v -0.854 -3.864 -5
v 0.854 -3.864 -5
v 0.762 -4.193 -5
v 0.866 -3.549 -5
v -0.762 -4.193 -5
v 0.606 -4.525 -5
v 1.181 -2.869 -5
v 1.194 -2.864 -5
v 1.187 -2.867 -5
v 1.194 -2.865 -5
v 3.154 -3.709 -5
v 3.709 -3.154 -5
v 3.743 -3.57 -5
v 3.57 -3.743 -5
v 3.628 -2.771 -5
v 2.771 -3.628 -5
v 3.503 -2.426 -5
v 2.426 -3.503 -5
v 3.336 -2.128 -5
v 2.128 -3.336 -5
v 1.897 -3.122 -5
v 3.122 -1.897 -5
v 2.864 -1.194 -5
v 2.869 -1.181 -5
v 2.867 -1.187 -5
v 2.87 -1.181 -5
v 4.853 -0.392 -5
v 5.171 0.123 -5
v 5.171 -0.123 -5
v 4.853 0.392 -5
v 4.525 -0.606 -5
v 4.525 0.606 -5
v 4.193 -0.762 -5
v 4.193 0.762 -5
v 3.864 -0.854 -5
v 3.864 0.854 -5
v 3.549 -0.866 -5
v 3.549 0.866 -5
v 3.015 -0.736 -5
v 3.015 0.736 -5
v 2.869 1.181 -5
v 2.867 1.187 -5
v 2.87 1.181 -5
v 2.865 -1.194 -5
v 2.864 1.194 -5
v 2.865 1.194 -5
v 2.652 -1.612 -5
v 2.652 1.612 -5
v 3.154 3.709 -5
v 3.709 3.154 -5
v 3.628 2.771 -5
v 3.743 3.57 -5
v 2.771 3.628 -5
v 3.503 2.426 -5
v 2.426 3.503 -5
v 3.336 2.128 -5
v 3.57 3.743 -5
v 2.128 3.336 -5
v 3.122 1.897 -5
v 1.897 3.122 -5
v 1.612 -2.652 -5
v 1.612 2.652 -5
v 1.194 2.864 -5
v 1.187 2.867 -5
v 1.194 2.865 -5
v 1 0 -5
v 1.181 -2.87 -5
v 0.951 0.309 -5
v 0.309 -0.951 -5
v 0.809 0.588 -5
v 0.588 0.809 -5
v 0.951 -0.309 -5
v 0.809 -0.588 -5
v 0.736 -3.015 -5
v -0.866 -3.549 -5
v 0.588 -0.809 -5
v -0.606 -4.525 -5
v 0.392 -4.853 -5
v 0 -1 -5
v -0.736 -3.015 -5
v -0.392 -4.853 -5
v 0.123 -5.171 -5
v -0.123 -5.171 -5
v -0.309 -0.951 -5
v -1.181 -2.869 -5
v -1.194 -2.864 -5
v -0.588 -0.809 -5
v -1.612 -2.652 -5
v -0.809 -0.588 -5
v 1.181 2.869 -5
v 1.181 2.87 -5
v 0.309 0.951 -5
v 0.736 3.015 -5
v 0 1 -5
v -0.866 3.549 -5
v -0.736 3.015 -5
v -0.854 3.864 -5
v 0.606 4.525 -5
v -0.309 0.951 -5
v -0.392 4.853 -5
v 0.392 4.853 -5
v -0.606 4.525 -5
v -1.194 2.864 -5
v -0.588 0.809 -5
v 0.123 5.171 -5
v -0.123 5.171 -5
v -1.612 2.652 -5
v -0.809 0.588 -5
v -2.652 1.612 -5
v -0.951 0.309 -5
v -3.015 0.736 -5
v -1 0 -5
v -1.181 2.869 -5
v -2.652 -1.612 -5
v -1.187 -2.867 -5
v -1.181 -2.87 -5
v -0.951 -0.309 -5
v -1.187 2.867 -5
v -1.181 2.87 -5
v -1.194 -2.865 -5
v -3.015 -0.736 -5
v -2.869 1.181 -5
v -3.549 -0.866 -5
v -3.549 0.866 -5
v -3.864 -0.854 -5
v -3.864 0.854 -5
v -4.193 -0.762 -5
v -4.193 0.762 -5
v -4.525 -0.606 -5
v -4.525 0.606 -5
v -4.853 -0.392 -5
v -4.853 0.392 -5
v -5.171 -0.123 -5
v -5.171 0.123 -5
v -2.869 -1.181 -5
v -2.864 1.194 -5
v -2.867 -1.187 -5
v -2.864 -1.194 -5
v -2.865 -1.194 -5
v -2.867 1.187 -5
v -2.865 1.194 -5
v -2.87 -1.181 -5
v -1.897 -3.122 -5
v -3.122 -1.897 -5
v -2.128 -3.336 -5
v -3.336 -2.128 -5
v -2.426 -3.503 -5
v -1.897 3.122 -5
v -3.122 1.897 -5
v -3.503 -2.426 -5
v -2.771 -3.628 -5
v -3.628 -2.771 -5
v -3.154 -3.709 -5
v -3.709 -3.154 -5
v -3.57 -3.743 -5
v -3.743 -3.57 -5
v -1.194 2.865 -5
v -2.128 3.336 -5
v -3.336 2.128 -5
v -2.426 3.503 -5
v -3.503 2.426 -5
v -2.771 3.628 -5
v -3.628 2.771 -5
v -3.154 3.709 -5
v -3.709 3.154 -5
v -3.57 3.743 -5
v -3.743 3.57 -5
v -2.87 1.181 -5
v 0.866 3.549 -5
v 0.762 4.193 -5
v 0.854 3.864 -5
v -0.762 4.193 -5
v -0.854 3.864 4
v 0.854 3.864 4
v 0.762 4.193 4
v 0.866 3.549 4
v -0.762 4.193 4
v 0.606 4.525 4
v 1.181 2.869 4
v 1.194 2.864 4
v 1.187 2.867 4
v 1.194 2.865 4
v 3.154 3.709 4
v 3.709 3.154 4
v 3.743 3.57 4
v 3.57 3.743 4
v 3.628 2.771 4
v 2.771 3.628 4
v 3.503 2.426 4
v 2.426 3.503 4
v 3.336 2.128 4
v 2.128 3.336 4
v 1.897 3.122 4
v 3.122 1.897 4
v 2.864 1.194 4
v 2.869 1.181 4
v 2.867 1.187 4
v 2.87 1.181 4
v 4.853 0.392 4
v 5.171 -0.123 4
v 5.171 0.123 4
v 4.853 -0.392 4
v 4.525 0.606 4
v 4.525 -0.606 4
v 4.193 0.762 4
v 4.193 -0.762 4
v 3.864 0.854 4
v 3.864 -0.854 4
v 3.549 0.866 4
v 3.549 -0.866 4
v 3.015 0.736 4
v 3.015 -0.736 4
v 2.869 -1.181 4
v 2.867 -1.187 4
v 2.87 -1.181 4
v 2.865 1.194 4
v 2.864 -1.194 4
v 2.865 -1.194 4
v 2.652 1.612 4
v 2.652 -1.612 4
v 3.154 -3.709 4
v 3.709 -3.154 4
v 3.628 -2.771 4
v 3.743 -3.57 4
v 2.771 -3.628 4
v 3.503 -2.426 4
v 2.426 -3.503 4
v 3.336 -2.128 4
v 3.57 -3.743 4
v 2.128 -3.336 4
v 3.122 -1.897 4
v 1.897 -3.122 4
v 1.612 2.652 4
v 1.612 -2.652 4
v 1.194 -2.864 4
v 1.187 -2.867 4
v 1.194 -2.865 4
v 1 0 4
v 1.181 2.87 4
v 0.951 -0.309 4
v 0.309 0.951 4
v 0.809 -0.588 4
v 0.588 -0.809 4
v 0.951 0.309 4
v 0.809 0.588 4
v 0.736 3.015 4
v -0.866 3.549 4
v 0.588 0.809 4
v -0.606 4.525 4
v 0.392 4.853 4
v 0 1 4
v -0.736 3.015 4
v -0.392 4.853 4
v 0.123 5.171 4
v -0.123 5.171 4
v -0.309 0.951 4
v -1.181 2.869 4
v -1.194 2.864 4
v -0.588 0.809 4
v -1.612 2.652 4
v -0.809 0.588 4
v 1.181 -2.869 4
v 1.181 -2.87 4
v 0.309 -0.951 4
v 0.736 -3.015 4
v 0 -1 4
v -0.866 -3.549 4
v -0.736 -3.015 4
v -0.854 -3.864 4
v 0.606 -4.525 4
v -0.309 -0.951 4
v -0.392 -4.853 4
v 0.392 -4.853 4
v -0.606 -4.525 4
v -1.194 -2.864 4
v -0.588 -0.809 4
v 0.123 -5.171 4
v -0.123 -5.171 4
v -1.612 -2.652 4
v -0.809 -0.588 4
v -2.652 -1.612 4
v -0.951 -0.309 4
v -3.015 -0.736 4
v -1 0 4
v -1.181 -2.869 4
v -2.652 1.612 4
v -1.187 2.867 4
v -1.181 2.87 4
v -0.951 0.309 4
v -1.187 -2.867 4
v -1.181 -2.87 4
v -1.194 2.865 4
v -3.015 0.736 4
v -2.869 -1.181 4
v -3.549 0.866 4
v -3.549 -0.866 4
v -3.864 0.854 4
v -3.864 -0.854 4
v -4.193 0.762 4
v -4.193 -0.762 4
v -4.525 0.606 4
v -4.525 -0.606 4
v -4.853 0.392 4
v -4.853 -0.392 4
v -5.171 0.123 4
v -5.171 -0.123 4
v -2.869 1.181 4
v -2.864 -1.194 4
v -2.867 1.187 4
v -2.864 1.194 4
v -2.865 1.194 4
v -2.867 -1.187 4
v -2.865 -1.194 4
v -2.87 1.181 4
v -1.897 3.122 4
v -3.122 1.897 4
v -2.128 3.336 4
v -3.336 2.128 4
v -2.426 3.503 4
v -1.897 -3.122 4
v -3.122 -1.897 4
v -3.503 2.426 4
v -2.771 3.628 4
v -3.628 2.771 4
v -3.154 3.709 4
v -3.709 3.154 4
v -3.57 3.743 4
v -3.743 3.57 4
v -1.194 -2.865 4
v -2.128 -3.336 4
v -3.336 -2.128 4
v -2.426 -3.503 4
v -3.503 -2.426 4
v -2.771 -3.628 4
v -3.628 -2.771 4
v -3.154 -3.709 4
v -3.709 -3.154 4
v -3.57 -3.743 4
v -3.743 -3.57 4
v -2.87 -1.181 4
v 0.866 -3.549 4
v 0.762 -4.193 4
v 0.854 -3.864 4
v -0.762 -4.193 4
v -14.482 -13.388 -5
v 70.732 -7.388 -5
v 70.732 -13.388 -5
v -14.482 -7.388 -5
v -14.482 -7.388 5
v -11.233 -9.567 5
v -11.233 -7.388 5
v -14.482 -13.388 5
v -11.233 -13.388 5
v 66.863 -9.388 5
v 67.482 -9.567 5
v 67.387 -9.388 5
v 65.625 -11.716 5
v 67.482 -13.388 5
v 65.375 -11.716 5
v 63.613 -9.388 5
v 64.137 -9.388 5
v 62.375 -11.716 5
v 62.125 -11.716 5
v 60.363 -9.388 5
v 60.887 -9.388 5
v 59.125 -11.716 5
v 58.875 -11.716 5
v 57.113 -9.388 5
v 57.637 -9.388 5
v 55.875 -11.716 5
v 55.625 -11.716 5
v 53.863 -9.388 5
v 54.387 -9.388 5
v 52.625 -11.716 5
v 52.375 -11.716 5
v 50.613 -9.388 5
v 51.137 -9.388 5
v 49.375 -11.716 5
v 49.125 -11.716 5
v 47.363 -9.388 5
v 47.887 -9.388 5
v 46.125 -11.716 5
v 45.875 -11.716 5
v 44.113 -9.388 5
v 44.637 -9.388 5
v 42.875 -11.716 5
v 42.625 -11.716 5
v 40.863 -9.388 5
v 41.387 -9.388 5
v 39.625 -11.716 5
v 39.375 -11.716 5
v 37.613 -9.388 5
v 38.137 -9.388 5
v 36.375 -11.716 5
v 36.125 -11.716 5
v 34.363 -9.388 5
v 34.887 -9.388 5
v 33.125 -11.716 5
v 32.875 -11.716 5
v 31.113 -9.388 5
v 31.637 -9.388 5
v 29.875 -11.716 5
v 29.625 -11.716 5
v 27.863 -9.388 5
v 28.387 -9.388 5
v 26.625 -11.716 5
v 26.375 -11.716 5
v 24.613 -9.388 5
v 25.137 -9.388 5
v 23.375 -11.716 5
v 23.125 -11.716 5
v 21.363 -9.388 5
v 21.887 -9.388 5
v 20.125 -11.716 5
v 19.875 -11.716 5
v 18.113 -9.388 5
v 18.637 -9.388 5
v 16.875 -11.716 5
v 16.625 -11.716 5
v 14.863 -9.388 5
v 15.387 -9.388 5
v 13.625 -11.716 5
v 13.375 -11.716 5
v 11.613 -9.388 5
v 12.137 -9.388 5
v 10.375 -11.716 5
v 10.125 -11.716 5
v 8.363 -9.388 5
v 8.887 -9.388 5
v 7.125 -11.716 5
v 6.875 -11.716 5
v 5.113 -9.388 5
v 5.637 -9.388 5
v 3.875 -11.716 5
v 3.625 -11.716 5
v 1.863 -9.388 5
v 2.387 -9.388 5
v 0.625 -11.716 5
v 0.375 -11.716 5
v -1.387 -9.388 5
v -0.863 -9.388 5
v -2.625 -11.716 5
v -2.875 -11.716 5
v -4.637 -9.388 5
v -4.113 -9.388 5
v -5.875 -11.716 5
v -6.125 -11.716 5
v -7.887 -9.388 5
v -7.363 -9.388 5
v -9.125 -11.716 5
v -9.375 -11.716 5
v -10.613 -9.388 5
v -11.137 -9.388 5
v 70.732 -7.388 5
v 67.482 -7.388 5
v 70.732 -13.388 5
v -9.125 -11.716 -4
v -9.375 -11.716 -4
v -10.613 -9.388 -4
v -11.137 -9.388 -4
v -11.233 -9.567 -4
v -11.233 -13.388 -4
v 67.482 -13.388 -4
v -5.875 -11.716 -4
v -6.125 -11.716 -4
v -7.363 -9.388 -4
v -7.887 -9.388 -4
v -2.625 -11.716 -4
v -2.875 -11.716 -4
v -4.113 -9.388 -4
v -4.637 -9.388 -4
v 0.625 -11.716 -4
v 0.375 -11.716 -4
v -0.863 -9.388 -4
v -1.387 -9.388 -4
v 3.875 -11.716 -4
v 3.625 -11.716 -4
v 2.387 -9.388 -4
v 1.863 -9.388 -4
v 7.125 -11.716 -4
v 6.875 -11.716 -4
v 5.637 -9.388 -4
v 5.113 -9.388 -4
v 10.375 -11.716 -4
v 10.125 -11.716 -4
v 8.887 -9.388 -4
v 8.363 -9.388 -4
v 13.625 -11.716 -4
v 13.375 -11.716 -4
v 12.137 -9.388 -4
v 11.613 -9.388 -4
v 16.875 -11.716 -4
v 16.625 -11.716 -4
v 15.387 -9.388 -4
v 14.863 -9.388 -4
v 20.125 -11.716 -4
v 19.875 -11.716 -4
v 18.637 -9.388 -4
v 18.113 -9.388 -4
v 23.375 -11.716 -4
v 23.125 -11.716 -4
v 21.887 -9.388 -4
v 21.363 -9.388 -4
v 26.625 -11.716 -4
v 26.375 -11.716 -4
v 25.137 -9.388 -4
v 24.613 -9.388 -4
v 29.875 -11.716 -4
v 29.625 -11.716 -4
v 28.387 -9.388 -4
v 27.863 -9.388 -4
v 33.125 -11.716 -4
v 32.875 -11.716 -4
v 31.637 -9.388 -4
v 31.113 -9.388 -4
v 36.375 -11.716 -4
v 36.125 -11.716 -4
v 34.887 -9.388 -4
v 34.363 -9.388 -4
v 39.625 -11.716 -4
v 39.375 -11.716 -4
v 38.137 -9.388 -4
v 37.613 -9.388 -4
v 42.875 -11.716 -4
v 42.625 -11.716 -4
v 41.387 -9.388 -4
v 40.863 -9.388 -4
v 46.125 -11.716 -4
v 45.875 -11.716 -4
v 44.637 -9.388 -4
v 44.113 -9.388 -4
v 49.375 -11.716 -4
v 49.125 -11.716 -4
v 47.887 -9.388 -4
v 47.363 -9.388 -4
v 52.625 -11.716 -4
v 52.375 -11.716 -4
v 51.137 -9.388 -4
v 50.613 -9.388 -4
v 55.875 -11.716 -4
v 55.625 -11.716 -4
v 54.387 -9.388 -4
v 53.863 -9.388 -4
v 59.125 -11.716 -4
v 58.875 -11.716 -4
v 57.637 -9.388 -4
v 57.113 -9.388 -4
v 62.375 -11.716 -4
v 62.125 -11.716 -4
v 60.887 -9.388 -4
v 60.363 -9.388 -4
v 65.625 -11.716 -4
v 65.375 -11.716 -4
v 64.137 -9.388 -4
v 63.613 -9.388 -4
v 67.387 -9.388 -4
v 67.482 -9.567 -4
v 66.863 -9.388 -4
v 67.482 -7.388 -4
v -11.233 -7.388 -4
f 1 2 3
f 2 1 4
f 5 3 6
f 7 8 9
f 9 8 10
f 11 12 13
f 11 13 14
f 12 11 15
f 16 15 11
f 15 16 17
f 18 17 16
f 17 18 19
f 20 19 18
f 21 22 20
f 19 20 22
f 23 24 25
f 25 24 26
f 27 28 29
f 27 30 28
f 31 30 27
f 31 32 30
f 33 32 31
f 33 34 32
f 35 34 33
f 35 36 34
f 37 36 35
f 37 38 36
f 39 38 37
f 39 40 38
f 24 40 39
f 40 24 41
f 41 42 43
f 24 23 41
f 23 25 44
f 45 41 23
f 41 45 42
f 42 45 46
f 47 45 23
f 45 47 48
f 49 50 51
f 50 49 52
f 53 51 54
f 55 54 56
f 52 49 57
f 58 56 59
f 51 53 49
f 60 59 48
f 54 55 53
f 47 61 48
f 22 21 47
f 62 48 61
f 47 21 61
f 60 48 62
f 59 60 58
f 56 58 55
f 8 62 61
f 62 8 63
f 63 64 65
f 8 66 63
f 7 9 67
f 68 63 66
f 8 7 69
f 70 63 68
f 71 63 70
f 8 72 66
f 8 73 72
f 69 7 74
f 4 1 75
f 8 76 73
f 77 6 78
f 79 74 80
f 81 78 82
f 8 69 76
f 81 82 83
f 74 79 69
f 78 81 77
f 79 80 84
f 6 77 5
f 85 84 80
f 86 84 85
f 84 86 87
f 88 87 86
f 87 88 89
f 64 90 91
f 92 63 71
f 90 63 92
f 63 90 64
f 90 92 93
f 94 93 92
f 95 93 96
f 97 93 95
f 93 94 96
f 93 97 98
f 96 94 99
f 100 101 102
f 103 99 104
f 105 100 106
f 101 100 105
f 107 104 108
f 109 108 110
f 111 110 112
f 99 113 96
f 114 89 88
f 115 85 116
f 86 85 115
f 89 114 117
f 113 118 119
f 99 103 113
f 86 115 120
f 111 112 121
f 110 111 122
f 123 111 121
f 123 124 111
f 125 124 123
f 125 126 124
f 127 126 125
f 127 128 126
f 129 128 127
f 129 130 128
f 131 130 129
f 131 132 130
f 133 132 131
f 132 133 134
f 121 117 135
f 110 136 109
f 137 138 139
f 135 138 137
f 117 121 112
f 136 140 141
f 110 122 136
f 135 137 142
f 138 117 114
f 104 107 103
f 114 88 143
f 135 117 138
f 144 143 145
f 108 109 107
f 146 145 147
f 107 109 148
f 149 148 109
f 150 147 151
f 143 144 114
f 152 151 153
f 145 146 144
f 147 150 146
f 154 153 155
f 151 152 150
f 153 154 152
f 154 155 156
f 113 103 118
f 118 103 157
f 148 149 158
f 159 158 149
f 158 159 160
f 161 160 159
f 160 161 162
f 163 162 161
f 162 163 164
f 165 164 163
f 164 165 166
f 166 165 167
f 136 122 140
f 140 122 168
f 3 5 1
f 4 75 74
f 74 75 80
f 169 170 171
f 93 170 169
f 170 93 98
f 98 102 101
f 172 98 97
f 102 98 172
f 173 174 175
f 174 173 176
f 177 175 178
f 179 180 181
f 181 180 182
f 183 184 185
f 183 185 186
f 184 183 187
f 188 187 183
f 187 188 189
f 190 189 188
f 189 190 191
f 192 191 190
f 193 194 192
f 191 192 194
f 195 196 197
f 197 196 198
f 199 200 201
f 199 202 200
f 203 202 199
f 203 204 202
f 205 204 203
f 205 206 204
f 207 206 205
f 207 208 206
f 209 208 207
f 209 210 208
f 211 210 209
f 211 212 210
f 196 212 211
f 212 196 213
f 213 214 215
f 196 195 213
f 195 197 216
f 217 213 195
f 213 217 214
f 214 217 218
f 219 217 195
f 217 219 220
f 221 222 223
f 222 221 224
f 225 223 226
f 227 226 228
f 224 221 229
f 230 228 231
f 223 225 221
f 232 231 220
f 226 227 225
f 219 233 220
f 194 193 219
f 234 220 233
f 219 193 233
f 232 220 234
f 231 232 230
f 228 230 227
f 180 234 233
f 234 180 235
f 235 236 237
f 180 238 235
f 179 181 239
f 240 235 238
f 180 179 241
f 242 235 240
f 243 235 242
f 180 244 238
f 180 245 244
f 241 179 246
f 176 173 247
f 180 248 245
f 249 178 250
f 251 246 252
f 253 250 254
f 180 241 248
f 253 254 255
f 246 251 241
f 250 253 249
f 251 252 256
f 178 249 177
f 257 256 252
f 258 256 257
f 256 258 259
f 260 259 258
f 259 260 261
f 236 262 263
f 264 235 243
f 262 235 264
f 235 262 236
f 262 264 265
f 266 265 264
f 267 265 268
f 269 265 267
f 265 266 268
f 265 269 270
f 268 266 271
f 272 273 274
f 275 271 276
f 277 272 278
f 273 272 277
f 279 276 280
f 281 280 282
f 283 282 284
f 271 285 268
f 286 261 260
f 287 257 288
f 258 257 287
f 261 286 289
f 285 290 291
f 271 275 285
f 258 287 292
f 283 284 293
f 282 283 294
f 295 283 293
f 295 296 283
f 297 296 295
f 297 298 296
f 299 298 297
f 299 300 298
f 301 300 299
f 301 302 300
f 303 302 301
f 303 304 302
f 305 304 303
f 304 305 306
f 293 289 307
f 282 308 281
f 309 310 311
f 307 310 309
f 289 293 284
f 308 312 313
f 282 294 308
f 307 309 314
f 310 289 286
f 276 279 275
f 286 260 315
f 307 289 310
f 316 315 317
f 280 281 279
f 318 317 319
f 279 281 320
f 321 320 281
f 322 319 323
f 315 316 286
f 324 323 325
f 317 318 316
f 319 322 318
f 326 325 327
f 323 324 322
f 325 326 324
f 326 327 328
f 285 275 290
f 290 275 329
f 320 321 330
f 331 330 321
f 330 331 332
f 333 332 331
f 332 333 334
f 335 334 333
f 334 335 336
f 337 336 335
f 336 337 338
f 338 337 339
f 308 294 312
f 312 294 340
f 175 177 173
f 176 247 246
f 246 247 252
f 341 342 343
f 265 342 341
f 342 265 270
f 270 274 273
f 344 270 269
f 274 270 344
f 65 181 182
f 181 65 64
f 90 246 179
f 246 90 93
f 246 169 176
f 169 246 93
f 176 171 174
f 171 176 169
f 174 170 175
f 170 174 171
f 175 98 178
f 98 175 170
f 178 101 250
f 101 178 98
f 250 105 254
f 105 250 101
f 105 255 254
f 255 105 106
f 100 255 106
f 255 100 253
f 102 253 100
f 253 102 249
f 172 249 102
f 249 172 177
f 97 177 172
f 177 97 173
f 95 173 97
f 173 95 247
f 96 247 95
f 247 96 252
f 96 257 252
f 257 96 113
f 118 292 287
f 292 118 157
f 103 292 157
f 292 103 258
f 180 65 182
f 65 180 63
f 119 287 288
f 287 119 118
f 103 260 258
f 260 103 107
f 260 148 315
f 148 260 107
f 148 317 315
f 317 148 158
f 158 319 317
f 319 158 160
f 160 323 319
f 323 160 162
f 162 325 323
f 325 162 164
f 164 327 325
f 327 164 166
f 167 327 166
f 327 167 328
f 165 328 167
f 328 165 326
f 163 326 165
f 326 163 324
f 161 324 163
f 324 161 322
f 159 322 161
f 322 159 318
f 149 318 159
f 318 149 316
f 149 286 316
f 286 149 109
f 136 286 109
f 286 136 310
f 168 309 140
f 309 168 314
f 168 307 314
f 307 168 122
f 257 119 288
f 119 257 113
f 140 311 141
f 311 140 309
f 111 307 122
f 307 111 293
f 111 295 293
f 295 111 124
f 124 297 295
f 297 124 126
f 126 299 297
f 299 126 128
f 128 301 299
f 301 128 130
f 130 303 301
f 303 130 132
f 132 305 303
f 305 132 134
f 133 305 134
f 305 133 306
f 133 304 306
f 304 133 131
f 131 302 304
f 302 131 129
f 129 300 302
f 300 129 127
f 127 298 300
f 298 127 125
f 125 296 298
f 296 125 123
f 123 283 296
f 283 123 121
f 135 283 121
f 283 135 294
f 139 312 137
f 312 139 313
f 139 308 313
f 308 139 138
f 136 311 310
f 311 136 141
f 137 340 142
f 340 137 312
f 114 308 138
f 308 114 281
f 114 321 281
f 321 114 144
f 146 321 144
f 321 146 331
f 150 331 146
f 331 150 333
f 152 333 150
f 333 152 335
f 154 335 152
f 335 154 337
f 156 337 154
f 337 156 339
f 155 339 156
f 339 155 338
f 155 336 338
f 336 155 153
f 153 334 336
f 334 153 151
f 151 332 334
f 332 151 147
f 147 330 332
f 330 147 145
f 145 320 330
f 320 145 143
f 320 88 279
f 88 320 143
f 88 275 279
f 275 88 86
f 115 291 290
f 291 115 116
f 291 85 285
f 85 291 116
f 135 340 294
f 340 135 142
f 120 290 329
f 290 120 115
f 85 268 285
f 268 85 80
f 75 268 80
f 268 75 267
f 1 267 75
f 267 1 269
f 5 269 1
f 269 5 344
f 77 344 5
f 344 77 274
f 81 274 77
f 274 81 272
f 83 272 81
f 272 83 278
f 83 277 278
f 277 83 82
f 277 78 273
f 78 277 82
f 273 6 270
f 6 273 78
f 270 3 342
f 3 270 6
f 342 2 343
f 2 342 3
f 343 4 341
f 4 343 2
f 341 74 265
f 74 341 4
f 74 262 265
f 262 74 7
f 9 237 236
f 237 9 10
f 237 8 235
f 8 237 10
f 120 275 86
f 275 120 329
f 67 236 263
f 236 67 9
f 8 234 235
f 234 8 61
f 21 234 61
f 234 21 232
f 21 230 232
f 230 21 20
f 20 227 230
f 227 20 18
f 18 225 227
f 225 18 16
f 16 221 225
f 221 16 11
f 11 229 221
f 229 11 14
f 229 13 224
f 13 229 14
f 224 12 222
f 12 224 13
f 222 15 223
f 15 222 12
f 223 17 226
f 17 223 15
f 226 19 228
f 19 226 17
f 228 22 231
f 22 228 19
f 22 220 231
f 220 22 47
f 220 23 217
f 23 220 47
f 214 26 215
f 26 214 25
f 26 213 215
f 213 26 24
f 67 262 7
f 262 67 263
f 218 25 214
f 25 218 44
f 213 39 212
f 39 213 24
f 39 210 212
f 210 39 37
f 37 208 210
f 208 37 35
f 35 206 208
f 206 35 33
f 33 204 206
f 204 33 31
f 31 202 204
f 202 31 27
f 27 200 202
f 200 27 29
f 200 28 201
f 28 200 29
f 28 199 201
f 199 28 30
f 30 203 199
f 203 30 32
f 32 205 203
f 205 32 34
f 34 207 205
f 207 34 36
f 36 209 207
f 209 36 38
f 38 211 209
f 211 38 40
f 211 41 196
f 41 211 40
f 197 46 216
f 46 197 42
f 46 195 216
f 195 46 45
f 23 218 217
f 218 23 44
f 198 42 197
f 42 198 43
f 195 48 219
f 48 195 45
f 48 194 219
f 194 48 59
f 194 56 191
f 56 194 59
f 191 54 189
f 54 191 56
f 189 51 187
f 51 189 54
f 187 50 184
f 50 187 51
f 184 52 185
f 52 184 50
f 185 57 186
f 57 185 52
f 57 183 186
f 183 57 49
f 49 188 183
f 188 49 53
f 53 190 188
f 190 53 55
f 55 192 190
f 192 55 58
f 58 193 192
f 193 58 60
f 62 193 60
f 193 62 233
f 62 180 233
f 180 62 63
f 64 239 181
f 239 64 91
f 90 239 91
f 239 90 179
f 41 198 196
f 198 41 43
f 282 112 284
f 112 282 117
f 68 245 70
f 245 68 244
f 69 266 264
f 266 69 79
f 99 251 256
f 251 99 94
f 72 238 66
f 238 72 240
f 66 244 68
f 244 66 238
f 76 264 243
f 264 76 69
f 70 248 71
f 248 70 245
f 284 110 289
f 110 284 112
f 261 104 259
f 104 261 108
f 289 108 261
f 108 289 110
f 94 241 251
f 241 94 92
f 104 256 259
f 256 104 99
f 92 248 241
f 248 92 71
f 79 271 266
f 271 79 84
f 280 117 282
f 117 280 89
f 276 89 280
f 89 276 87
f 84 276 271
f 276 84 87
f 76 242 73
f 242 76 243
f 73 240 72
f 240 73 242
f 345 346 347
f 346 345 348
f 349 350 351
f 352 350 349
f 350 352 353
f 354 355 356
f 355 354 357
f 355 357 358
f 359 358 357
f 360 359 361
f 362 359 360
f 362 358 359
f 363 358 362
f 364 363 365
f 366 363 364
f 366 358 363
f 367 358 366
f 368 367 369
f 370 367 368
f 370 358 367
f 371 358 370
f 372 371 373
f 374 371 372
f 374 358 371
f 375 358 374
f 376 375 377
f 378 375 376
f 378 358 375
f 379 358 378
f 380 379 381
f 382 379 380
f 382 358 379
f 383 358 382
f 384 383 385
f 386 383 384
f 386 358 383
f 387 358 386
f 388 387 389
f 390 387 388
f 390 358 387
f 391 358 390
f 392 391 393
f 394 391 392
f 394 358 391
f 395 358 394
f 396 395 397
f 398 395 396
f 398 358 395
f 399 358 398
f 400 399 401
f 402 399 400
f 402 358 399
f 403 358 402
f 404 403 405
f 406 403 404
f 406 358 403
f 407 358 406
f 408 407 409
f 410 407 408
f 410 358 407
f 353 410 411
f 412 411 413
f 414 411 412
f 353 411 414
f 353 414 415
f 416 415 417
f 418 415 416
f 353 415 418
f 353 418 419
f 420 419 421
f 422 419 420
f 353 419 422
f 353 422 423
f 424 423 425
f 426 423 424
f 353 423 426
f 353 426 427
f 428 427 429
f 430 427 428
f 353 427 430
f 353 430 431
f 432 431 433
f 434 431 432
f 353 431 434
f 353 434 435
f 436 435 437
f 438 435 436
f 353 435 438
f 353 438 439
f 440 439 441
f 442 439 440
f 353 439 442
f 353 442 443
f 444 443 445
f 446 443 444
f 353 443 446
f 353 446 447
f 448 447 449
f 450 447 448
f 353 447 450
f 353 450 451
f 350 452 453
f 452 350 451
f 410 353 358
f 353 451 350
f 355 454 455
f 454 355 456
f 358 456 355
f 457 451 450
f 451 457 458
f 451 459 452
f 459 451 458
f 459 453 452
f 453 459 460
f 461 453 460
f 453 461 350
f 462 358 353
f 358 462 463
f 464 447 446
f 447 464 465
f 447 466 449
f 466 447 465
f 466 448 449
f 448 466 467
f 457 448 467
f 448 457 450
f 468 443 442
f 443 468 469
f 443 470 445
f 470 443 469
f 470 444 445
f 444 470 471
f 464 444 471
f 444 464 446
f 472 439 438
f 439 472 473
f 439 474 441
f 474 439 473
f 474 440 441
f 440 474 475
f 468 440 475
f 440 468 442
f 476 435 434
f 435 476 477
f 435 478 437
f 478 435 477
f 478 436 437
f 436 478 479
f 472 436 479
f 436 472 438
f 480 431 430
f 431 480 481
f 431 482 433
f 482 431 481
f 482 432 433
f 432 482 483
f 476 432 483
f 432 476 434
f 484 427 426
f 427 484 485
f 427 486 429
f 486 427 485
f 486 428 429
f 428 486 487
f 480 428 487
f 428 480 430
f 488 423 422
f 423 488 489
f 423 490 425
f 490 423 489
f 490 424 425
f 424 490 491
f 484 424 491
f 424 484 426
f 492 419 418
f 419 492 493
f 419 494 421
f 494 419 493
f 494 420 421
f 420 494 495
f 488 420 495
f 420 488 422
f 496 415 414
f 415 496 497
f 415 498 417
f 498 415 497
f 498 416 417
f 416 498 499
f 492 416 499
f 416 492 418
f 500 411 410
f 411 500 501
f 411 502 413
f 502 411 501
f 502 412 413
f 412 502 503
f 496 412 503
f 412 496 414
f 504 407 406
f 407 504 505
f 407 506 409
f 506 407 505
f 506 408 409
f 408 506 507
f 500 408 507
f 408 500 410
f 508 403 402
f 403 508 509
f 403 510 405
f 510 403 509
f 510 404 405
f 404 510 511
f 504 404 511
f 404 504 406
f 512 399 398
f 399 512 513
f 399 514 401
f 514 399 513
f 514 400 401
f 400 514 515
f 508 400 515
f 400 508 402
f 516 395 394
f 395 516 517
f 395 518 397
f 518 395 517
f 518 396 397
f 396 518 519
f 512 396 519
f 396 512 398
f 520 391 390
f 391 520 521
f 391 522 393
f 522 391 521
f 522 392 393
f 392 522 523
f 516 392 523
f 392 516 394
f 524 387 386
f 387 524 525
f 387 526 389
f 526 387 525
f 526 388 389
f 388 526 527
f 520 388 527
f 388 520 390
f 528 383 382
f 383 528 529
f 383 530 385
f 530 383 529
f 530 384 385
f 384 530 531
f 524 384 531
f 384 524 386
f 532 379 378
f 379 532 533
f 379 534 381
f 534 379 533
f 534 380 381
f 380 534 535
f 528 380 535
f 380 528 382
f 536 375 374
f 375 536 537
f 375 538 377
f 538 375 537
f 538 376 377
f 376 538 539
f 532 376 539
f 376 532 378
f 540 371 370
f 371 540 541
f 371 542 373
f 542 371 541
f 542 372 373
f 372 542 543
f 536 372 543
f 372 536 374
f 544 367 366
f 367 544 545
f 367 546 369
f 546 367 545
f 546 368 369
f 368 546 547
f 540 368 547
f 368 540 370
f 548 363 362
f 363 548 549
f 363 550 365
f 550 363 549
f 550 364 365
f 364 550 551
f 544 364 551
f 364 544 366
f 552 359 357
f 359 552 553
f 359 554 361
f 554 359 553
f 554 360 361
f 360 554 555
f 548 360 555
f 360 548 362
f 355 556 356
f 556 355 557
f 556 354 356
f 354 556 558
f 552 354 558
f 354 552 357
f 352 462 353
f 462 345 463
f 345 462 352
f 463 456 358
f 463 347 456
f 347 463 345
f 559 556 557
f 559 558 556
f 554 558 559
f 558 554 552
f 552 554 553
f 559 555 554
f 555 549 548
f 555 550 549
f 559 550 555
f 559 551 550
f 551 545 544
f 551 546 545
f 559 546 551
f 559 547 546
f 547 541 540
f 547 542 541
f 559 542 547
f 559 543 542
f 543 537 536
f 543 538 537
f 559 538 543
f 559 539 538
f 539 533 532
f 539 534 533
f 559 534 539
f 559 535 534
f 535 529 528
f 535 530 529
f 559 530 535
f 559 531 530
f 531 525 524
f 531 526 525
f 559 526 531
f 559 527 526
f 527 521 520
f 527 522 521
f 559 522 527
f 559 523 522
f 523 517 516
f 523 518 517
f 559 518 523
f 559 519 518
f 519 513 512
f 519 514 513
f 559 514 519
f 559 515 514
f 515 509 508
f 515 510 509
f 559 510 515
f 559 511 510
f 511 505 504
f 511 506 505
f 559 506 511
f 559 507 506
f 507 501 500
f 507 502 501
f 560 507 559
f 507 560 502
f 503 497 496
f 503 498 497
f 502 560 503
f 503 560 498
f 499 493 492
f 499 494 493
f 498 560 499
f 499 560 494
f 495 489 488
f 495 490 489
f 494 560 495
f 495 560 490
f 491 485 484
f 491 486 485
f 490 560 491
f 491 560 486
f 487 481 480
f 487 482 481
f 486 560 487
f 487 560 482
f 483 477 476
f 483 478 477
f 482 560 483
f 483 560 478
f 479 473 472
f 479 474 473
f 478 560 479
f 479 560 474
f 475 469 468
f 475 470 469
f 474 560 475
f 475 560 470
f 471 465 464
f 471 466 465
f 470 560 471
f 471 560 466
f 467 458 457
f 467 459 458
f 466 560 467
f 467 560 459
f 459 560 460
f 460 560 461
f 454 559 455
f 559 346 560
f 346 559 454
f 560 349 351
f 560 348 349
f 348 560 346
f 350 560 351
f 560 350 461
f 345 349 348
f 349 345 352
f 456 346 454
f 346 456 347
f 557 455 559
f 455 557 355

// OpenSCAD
//This is a modification of " Public Domain Parametric Involute Spur Gear (and involute helical gear and involute rack)
// by Leemon Baird, 2011, Leemon@Leemon.com
//http://www.thingiverse.com/thing:5505  "

//Modifications by racatack June 2016:
//  -Incorporated 'module InvoluteGear_rack()' from the 11/11/15 comment by quisam2342 in thing:5505 to fix noted problems in rack generation at various tooth sizes
//  -Added a section for an optional 'backboard' that can be used to stiffen an otherwise skinny rack
//  -Added sections for optional Stop Blocks at either or both ends of a rack
//  -Removed extra gears from the example since I only need one pinion. See thing:5505 example section to gain more insight into gear generation.





//////////////////////////////////////////////////////////////////////////////////////////////
// Public Domain Parametric Involute Spur Gear (and involute helical gear and involute rack)
// version 1.1
// by Leemon Baird, 2011, Leemon@Leemon.com
//http://www.thingiverse.com/thing:5505
//
// This file is public domain.  Use it for any purpose, including commercial
// applications.  Attribution would be nice, but is not required.  There is
// no warranty of any kind, including its correctness, usefulness, or safety.
//
// This is parameterized involute spur (or helical) gear.  It is much simpler and less powerful than
// others on Thingiverse.  But it is public domain.  I implemented it from scratch from the
// descriptions and equations on Wikipedia and the web, using Mathematica for calculations and testing,
// and I now release it into the public domain.
//
//		http://en.wikipedia.org/wiki/Involute_gear
//		http://en.wikipedia.org/wiki/Gear
//		http://en.wikipedia.org/wiki/List_of_gear_nomenclature
//		http://gtrebaol.free.fr/doc/catia/spur_gear.html
//		http://www.cs.cmu.edu/~rapidproto/mechanisms/chpt7.html
//
// The module gear() gives an involute spur gear, with reasonable defaults for all the parameters.
// Normally, you should just choose the first 4 parameters, and let the rest be default values.
// The module gear() gives a gear in the XY plane, centered on the origin, with one tooth centered on
// the positive Y axis.  The various functions below it take the same parameters, and return various
// measurements for the gear.  The most important is pitch_radius, which tells how far apart to space
// gears that are meshing, and adendum_radius, which gives the size of the region filled by the gear.
// A gear has a "pitch circle", which is an invisible circle that cuts through the middle of each
// tooth (though not the exact center). In order for two gears to mesh, their pitch circles should
// just touch.  So the distance between their centers should be pitch_radius() for one, plus pitch_radius()
// for the other, which gives the radii of their pitch circles.
//
// In order for two gears to mesh, they must have the same mm_per_tooth and pressure_angle parameters.
// mm_per_tooth gives the number of millimeters of arc around the pitch circle covered by one tooth and one
// space between teeth.  The pitch angle controls how flat or bulged the sides of the teeth are.  Common
// values include 14.5 degrees and 20 degrees, and occasionally 25.  Though I've seen 28 recommended for
// plastic gears. Larger numbers bulge out more, giving stronger teeth, so 28 degrees is the default here.
//
// The ratio of number_of_teeth for two meshing gears gives how many times one will make a full
// revolution when the the other makes one full revolution.  If the two numbers are coprime (i.e.
// are not both divisible by the same number greater than 1), then every tooth on one gear
// will meet every tooth on the other, for more even wear.  So coprime numbers of teeth are good.
//
// The module rack() gives a rack, which is a bar with teeth.  A rack can mesh with any
// gear that has the same mm_per_tooth and pressure_angle.
//
// Some terminology:
// The outline of a gear is a smooth circle (the "pitch circle") which has mountains and valleys
// added so it is toothed.  So there is an inner circle (the "root circle") that touches the
// base of all the teeth, an outer circle that touches the tips of all the teeth,
// and the invisible pitch circle in between them.  There is also a "base circle", which can be smaller than
// all three of the others, which controls the shape of the teeth.  The side of each tooth lies on the path
// that the end of a string would follow if it were wrapped tightly around the base circle, then slowly unwound.
// That shape is an "involute", which gives this type of gear its name.
//
//////////////////////////////////////////////////////////////////////////////////////////////

//An involute spur gear, with reasonable defaults for all the parameters.
//Normally, you should just choose the first 4 parameters, and let the rest be default values.
//Meshing gears must match in mm_per_tooth, pressure_angle, and twist,
//and be separated by the sum of their pitch radii, which can be found with pitch_radius().
module gear (
        mm_per_tooth    = 3,    //this is the "circular pitch", the circumference of the pitch circle divided by the number of teeth
        number_of_teeth = 11,   //total number of teeth around the entire perimeter
        thickness       = 6,    //thickness of gear in mm
        hole_diameter   = 3,    //diameter of the hole in the center, in mm
        twist           = 0,    //teeth rotate this many degrees from bottom of gear to top.  360 makes the gear a screw with each thread going around once
        teeth_to_hide   = 0,    //number of teeth to delete to make this only a fraction of a circle
        pressure_angle  = 28,   //Controls how straight or bulged the tooth sides are. In degrees.
        clearance       = 0.0,  //gap between top of a tooth on one gear and bottom of valley on a meshing gear (in millimeters)
        backlash        = 0.0   //gap between two meshing teeth, in the direction along the circumference of the pitch circle
    )
{
assign(pi = 3.1415926)
assign(p  = mm_per_tooth * number_of_teeth / pi / 2)  //radius of pitch circle
assign(c  = p + mm_per_tooth / pi - clearance)        //radius of outer circle
assign(b  = p*cos(pressure_angle))                    //radius of base circle
assign(r  = p-(c-p)-clearance)                        //radius of root circle
assign(t  = mm_per_tooth/2-backlash/2)                //tooth thickness at pitch circle
assign(k  = -iang(b, p) - t/2/p/pi*180)               //angle to where involute meets base circle on each side of tooth
{
    difference()
    {
        for (i = [0:number_of_teeth-teeth_to_hide-1] )
            rotate([0,0,i*360/number_of_teeth])
            linear_extrude(height = thickness, center = true, convexity = 10, twist = twist)
            polygon(
                points=[
                           [0, -hole_diameter/10],
                           polar(r, -181/number_of_teeth),
                           polar(r, r<b ? k : -180/number_of_teeth),
                           q7(0/5,r,b,c,k, 1),q7(1/5,r,b,c,k, 1),q7(2/5,r,b,c,k, 1),q7(3/5,r,b,c,k, 1),q7(4/5,r,b,c,k, 1),q7(5/5,r,b,c,k, 1),
                           q7(5/5,r,b,c,k,-1),q7(4/5,r,b,c,k,-1),q7(3/5,r,b,c,k,-1),q7(2/5,r,b,c,k,-1),q7(1/5,r,b,c,k,-1),q7(0/5,r,b,c,k,-1),
                           polar(r, r<b ? -k : 180/number_of_teeth),
                           polar(r, 181/number_of_teeth)
                       ],
                paths=[[0,1,2,3,4,5,6,7,8,9,10,11,12,13,14,15,16]]
            );
        cylinder(h=2*thickness+1, r=hole_diameter/2, center=true, $fn=20);
    }
}
};
//these 4 functions are used by gear
function polar(r,theta)   = r*[sin(theta), cos(theta)];                            //convert polar to cartesian coordinates
function iang(r1,r2)      = sqrt((r2/r1)*(r2/r1) - 1)/3.1415926*180 - acos(r1/r2); //unwind a string this many degrees to go from radius r1 to radius r2
function q7(f,r,b,r2,t,s) = q6(b,s,t,(1-f)*max(b,r)+f*r2);                         //radius a fraction f up the curved side of the tooth
function q6(b,s,t,d)      = polar(d,s*(iang(b,d)+t));                              //point at radius d on the involute curve

//a rack, which is a straight line with teeth (the same as a segment from a giant gear with a huge number of teeth).
//The "pitch circle" is a line along the X axis.
//module rack (
//	mm_per_tooth    = 3,    //this is the "circular pitch", the circumference of the pitch circle divided by the number //of teeth
//	number_of_teeth = 11,   //total number of teeth along the rack
//	thickness       = 6,    //thickness of rack in mm (affects each tooth)
//	height          = 120,   //height of rack in mm, from tooth top to far side of rack.
//	pressure_angle  = 28,   //Controls how straight or bulged the tooth sides are. In degrees.
//	backlash        = 0.0   //gap between two meshing teeth, in the direction along the circumference of the pitch circle
//) {
//	assign(pi = 3.1415926)
//	assign(a = mm_per_tooth / pi) //addendum
//	assign(t = a*cos(pressure_angle)-1)         //tooth side is tilted so top/bottom corners move this amount
//		for (i = [0:number_of_teeth-1] )
//			translate([i*mm_per_tooth,0,0])
//				linear_extrude(height = thickness, center = true, convexity = 10)
//					polygon(
//						points=[
//							[-mm_per_tooth * 3/4,                 a-height],
//							[-mm_per_tooth * 3/4 - backlash,     -a],
//							[-mm_per_tooth * 1/4 + backlash - t, -a],
//							[-mm_per_tooth * 1/4 + backlash + t,  a],
//							[ mm_per_tooth * 1/4 - backlash - t,  a],
//							[ mm_per_tooth * 1/4 - backlash + t, -a],
//							[ mm_per_tooth * 3/4 + backlash,     -a],
//							[ mm_per_tooth * 3/4,                 a-height],
//						],
//						paths=[[0,1,2,3,4,5,6,7]]
//					);
//};


//rac note - This section generates the rack body and teeth. It is from the 11/11/15 comment by quisam2342 in thing:5505 to fix noted problems with rack generation, and replaces the original 'module rack()'
////////////////////////////////////////////////////////////////////////////////////////////////
// The module InvoluteGear_rack() gives a involute gear rack, which is a bar with teeth.
// A rack can mesh with any gear that has the same mm_per_tooth and pressure_angle.
// The "pitch circle" is a line along the X axis.
//
// mm_per_tooth     this is the "circular pitch", the circumference of the pitch circle
//                  divided by the number of teeth
//
// number_of_teeth  total number of teeth along the rack
//
// thickness        thickness of rack in mm
//
// height           height of rack in mm, from tooth top to far side of rack
//
// pressure_angle   controls how straight or bulged the tooth sides are, in degrees
//
// clearance        gap between top of a tooth on one gear and bottom of valley
//                  on a meshing gear, in millimeters
//
// backlash         gap between two meshing teeth, in the direction along the circumference
//                  of the pitch circle
////////////////////////////////////////////////////////////////////////////////////////////////



module InvoluteGear_rack (
        mm_per_tooth    = 3,   //Default numbers in this section get overridden by numbers in 'example rack and pinion' section, so set your values there.
        number_of_teeth = 11,
        thickness       = 6,
        height          = 4,

        //rac - Added variables for backboard and stop blocks:
//set your values in the 'example rack and pinion' section, as defaults given here will be overridden by that section
        backboard_thickness = 2.0,
        backboard_height = 1.0,
        stop_height = backboard_height,
        left_stop_enable = 1,
        right_stop_enable = 1,

//These defaults are not redefined in the example section:
        pressure_angle  = 28,
        clearance       = 0.0,
        backlash        = 0.0

    )

{
// addendum - tooth height above pitch line
assign(addendum =        module_value(mm_per_tooth) - clearance)

// dedendum - tooth height below pitch line
assign(dedendum = 1.25 * module_value(mm_per_tooth)            )


for (i = [0:number_of_teeth-1] )
    translate([(i+0.5)*mm_per_tooth,height-addendum,0])
    linear_extrude(height = thickness, center = true, convexity = 10)  //'height' parameter here is not the same as 'height' parameter of module
    polygon(
        points=[
                   [-1/2 * mm_per_tooth,                                              addendum-height],
                   [-1/2 * mm_per_tooth,                                             -dedendum],
                   [-1/4 * mm_per_tooth + backlash - dedendum * tan(pressure_angle), -dedendum],
                   [-1/4 * mm_per_tooth + backlash + addendum * tan(pressure_angle),  addendum],
                   [ 1/4 * mm_per_tooth - backlash - addendum * tan(pressure_angle),  addendum],
                   [ 1/4 * mm_per_tooth - backlash + dedendum * tan(pressure_angle), -dedendum],
                   [ 1/2 * mm_per_tooth,                                             -dedendum],
                   [ 1/2 * mm_per_tooth,                                              addendum-height],
               ],
        paths=[[0,1,2,3,4,5,6,7]]
    );

//rac -added - This section optionally creates a 'stop block' at the left end of the rack
translate([(-0.11)*mm_per_tooth,0,0.5*(-thickness)])
linear_extrude(height = left_stop_enable*thickness, center = false, convexity = 10)
polygon(
    points=[
               [-1/2 * mm_per_tooth,height+stop_height],   //stop_height extends stop block above teeth, change the number to change the extension amount
               [-1/2 * mm_per_tooth,0],
               [ 1/2 * mm_per_tooth,0],
               [ 1/2 * mm_per_tooth,height+stop_height],   //stop_height extends stop block above teeth, change the number to change the extension amount
            ],
    paths=[[0,1,2,3]]
);


//rac -added - This section optionally creates a 'stop block' at the right end of the rack
translate([(0.11+number_of_teeth)*mm_per_tooth,0,0.5*(-thickness)])
linear_extrude(height = right_stop_enable*thickness, center = false, convexity = 10)
polygon(
    points=[
               [-1/2 * mm_per_tooth,height+stop_height],   //stop_height extends stop block above teeth
               [-1/2 * mm_per_tooth,0],
               [ 1/2 * mm_per_tooth,0],
               [ 1/2 * mm_per_tooth,height+stop_height],   //stop_height extends stop block above teeth
            ],
    paths=[[0,1,2,3]]
);


//rac -added - This section optionally creates a 'backboard' on one side of the rack. Can be used to add stiffness for a 'thin' rack (i.e. a rack with low height and/or thickness numbers) or if a large negative height is used it can extend under the rack as a mounting flange.
for (i = [0:number_of_teeth-1] )
    translate([(i+0.5)*mm_per_tooth,0,0.5*(-thickness+backboard_thickness)])
    //0.55*(-thickness+backboard_thickness) starts the backboard at one side of the rack and extrudes it inward
    linear_extrude(height = backboard_thickness, center = true, convexity = 10)
    polygon(
        points=[
                   [-1/2 * mm_per_tooth,height+backboard_height],   //backboard_height extends backboard above teeth
                   [-1/2 * mm_per_tooth,0],

                   [ 1/2 * mm_per_tooth,0],
                   [ 1/2 * mm_per_tooth,height+backboard_height],   //backboard_height extends backboard above teeth
               ],
        paths=[[0,1,2,3]]
    );


}


//These 5 functions let the user find the derived dimensions of the gear.
//A gear fits within a circle of radius outer_radius, and two gears should have
//their centers separated by the sum of their pictch_radius.
function circular_pitch  (mm_per_tooth=3) = mm_per_tooth;                     //tooth density expressed as "circular pitch" in millimeters
function diametral_pitch (mm_per_tooth=3) = 3.1415926 / mm_per_tooth;         //tooth density expressed as "diametral pitch" in teeth per millimeter
function module_value    (mm_per_tooth=3) = mm_per_tooth / 3.1415926;                //tooth density expressed as "module" or "modulus" in millimeters
function pitch_radius    (mm_per_tooth=3,number_of_teeth=11) = mm_per_tooth * number_of_teeth / 3.1415926 / 2;
function outer_radius    (mm_per_tooth=3,number_of_teeth=11,clearance=0.1)    //The gear fits entirely within a cylinder of this radius.
    = mm_per_tooth*(1+number_of_teeth/2)/3.1415926  - clearance;

//////////////////////////////////////////////////////////////////////////////////////////////
//example rack and pinion:
//ENTER YOUR VALUES HERE: (not in InvoluteGear_rack() defaults)

//all distances in mm
n1 = 8; //red gear number of teeth
n5 = 25;  //gray rack number of teeth
mm_per_tooth = 3.25; //all meshing gears need the same mm_per_tooth (and the same pressure_angle)
thickness    = 10;  // depth of the rack, including backboard if any. The pinion will be this depth minus the backboard_thickness
hole         = 2;   //hole diameter in pinion gear
height       = 4;  // distance from bottom of the rack to the tips of the teeth

//rac - Added - Set your values for Backboard and Stop Blocks here
backboard_thickness = 1.0; //set to zero for no backboard
backboard_height = 2;   //set to zero for top of backboard to be even with tips of teeth, a positive number will extend above the teeth by the chosen amount, vice-versa for negative (use large negative to make a flange on underside of rack)
stop_height = 2; //Stop Blocks will extend this much above the teeth, can be positive or negative
left_stop_enable = 1;  //set to 1 to generate Left Stop Block, set to 0 to disable
right_stop_enable = 1;  //set to 1 to generate Right Stop Block, set to 0 to disable

//end of inputs -------------------------------------------------------

d1 =pitch_radius(mm_per_tooth,n1);

//Generation of pinion gear:
translate([ 0,    0, -.5*backboard_thickness]) rotate([0,0, $t*360/n1])                 color([1.00,0.75,0.75]) gear(mm_per_tooth,n1,(thickness-backboard_thickness),hole); //rac -RE above: 'thickness-backboard_thickness' is used here to reduce gear thickness for backboard on rack, The '-.5*backboard_thickness' in translate puts gear bottom even with rack bottom

//Generation of rack, and Relative positioning of gear and rack:
translate([(-floor(n5/2)-floor(n1/2)+$t+n1/2-1/2), -height-backboard_height-d1-mm_per_tooth, 0]) rotate([0,0,0]) color([0.75,0.75,0.75]) InvoluteGear_rack(mm_per_tooth,n5,thickness,height,backboard_thickness,backboard_height,stop_height,left_stop_enable,right_stop_enable);   //rac - In the above 'translate' instruction, the middle parameter sets spacing between the rack and the pinion. I've set it to '-height-backboard_height-d1-mm_per_tooth' to give a proportionate offset that allows for ease of printing for most sets of gear & rack parameters. If you use a large negative backboard height the gear and rack may overlap. That can be fixed by substituting some other number/formula for '-height-backboard_height-d1-mm_per_tooth'. Try for example -3*d1, or just subtract an additional fixed offset from what's in there now (e.g. (-height-backboard_height-d1-mm_per_tooth)-14.)

//end of example rack and pinion
//////////////////////////////////////////////////////////////////////////////////////////////////
